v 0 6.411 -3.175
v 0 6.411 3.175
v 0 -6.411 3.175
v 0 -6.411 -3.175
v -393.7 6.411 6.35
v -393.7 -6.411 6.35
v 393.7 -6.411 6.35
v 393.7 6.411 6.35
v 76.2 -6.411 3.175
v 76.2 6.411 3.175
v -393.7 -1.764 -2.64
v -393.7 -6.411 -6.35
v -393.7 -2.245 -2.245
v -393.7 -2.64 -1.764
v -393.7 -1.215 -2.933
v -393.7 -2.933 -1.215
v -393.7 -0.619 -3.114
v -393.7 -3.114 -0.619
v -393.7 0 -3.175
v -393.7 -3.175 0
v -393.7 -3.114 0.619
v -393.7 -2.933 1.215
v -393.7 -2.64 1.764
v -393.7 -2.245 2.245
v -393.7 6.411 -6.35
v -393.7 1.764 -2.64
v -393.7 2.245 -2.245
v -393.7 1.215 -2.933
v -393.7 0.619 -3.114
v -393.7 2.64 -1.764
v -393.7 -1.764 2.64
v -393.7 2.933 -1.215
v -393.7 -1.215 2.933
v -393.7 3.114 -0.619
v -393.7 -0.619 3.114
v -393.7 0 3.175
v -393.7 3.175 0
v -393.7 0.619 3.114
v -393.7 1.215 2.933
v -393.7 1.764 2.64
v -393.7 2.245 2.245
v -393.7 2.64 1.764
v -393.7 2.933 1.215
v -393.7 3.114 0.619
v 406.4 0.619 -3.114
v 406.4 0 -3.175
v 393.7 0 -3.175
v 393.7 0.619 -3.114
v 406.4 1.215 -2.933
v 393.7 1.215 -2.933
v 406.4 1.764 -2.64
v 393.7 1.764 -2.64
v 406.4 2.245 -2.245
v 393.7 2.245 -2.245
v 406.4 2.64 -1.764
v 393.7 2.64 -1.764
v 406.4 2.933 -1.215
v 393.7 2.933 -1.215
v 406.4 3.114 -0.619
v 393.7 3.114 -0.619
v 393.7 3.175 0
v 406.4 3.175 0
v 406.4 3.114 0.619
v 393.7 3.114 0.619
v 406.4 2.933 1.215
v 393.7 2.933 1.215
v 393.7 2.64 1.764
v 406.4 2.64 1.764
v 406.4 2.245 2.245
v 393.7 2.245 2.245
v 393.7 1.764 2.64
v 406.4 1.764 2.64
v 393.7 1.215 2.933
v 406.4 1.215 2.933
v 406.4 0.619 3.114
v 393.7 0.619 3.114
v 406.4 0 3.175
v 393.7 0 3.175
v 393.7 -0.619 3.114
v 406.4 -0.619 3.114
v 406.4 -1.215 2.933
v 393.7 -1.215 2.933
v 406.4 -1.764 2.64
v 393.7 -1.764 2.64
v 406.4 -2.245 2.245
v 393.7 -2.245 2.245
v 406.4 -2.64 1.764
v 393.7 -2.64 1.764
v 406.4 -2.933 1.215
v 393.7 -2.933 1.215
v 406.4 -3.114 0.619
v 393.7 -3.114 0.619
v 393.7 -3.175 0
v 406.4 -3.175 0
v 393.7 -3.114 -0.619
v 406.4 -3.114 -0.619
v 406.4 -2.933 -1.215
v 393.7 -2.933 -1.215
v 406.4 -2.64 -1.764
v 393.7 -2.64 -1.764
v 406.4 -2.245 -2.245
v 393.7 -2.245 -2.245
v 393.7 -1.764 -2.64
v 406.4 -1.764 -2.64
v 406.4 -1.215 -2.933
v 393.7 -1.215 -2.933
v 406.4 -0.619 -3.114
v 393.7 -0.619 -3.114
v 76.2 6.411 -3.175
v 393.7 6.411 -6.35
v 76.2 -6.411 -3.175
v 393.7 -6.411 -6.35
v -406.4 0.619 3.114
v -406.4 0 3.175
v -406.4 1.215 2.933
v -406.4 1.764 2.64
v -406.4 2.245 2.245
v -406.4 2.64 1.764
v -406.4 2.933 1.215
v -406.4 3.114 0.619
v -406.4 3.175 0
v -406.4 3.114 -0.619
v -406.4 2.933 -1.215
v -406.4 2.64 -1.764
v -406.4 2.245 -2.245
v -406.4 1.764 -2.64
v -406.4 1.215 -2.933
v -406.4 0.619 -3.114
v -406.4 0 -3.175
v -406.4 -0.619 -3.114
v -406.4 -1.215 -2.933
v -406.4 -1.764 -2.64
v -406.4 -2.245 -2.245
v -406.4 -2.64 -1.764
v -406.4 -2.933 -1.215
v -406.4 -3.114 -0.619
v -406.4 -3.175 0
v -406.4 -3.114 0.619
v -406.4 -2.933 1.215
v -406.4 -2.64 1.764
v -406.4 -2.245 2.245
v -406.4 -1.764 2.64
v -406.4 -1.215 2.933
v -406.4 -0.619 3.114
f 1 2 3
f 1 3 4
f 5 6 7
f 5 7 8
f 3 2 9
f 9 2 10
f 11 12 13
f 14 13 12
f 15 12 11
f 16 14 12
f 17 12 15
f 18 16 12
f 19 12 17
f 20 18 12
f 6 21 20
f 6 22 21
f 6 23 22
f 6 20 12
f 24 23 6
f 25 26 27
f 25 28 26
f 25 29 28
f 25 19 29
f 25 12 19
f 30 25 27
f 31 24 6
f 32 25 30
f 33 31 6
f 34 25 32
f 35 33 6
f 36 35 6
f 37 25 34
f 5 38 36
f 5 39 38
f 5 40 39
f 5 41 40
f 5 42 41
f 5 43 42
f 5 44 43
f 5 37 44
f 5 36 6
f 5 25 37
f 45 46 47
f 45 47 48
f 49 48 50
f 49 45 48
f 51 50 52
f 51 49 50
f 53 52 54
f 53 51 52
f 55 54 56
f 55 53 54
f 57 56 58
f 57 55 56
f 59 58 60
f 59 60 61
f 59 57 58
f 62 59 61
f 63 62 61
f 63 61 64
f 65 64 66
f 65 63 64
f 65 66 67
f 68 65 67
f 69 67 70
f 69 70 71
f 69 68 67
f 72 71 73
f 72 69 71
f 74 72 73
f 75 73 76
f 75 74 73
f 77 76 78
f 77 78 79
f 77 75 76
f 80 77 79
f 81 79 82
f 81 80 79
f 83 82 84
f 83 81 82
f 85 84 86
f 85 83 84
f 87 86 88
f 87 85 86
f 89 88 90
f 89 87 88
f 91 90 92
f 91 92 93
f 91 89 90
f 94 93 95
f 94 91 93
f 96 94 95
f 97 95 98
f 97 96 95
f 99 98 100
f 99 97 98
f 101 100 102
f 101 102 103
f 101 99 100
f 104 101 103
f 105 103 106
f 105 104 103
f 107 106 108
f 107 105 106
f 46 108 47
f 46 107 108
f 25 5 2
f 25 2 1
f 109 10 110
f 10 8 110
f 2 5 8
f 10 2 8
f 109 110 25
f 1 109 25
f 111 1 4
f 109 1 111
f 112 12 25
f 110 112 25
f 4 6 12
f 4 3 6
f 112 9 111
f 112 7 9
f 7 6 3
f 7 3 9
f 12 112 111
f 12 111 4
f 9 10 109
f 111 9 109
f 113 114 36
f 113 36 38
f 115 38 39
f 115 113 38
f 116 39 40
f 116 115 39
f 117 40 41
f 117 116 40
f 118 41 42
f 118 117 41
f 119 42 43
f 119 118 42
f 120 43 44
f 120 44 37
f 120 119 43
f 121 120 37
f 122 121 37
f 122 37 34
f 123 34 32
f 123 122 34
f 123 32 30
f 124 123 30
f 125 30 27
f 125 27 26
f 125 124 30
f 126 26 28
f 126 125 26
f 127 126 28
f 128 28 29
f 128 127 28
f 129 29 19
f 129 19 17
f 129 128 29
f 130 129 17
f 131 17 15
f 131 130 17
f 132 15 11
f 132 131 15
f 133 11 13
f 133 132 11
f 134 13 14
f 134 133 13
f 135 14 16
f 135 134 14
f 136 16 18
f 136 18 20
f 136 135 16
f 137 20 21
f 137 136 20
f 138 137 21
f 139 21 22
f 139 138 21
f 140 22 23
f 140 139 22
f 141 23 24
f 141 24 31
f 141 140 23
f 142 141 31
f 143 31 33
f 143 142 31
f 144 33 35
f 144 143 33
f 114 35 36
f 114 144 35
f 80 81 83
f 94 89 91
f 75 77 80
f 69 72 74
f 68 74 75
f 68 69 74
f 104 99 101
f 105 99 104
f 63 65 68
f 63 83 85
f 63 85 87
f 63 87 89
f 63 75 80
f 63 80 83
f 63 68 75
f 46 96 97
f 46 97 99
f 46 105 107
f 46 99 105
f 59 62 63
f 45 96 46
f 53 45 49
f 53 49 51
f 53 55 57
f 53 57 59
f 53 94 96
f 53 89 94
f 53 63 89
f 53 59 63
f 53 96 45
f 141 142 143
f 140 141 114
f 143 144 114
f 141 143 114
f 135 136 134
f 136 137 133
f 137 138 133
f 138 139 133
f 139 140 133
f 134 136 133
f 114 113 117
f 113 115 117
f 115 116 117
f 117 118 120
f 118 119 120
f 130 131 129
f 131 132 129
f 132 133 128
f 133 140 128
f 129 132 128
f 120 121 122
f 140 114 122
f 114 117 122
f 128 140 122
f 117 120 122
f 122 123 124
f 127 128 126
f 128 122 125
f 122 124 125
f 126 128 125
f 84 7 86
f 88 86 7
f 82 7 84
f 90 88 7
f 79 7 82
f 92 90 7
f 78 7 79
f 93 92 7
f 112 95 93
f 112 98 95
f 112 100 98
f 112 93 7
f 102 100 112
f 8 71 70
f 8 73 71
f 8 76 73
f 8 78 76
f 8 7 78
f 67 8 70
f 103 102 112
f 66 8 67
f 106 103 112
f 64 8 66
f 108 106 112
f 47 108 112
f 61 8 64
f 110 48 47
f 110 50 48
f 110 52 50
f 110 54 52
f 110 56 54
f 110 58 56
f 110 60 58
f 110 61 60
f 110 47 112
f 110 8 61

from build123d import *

# Parameters (mm, degrees)
SKETCH1_W          = 12.7
SKETCH1_H          = 12.82133758
LENGTH_DEPTH       = 406.4
SKETCH2_W          = 12.7
SKETCH2_H          = 12.82133758
SKETCH2_R          = 3.175
ROUND_CUT_1_DEPTH  = 12.7
SKETCH3_W          = 12.7
SKETCH3_H          = 12.82133758
SKETCH3_R          = 3.175
ROUND_CUT_2_DEPTH  = 12.7
CUT_EXTRUDE1_REACH = 14.821
SKETCH5_W          = 76.2
SKETCH5_H          = 6.35


with BuildPart() as part:
    # Sketch1 → Length (new body, symmetric)
    with BuildSketch(Plane(origin=(0, 0, 0), x_dir=(0, 0, -1), z_dir=(1, 0, 0))):
        Rectangle(SKETCH1_W, SKETCH1_H)
    extrude(amount=LENGTH_DEPTH, both=True)

    # Sketch2 → Round Cut 1 (cut)
    with BuildSketch(Plane(origin=(406.4, 0, 0), x_dir=(0, 0, -1), z_dir=(1, 0, 0))):
        Rectangle(SKETCH2_W, SKETCH2_H)
        Circle(SKETCH2_R, mode=Mode.SUBTRACT)
    extrude(amount=-ROUND_CUT_1_DEPTH, mode=Mode.SUBTRACT)

    # Sketch3 → Round Cut 2 (cut)
    with BuildSketch(Plane.ZY.offset(406.4)):
        Rectangle(SKETCH3_W, SKETCH3_H)
        Circle(SKETCH3_R, mode=Mode.SUBTRACT)
    extrude(amount=-ROUND_CUT_2_DEPTH, mode=Mode.SUBTRACT)

    # Sketch5 → Cut-Extrude1 (cut, up to next)
    with BuildSketch(Plane(origin=(0, 6.41066879, 0), x_dir=(1, 0, 0), z_dir=(0, 1, 0)), mode=Mode.PRIVATE) as cut_extrude1_sk1:
        with Locations((38.1, 0)):
            Rectangle(SKETCH5_W, SKETCH5_H)
    cut_extrude1_tool1 = extrude(cut_extrude1_sk1.sketch, amount=-CUT_EXTRUDE1_REACH, mode=Mode.PRIVATE) & part.part
    add(cut_extrude1_tool1.solids().sort_by_distance((38.1, 6.410669, 0))[0], mode=Mode.SUBTRACT)


solid = part.part
